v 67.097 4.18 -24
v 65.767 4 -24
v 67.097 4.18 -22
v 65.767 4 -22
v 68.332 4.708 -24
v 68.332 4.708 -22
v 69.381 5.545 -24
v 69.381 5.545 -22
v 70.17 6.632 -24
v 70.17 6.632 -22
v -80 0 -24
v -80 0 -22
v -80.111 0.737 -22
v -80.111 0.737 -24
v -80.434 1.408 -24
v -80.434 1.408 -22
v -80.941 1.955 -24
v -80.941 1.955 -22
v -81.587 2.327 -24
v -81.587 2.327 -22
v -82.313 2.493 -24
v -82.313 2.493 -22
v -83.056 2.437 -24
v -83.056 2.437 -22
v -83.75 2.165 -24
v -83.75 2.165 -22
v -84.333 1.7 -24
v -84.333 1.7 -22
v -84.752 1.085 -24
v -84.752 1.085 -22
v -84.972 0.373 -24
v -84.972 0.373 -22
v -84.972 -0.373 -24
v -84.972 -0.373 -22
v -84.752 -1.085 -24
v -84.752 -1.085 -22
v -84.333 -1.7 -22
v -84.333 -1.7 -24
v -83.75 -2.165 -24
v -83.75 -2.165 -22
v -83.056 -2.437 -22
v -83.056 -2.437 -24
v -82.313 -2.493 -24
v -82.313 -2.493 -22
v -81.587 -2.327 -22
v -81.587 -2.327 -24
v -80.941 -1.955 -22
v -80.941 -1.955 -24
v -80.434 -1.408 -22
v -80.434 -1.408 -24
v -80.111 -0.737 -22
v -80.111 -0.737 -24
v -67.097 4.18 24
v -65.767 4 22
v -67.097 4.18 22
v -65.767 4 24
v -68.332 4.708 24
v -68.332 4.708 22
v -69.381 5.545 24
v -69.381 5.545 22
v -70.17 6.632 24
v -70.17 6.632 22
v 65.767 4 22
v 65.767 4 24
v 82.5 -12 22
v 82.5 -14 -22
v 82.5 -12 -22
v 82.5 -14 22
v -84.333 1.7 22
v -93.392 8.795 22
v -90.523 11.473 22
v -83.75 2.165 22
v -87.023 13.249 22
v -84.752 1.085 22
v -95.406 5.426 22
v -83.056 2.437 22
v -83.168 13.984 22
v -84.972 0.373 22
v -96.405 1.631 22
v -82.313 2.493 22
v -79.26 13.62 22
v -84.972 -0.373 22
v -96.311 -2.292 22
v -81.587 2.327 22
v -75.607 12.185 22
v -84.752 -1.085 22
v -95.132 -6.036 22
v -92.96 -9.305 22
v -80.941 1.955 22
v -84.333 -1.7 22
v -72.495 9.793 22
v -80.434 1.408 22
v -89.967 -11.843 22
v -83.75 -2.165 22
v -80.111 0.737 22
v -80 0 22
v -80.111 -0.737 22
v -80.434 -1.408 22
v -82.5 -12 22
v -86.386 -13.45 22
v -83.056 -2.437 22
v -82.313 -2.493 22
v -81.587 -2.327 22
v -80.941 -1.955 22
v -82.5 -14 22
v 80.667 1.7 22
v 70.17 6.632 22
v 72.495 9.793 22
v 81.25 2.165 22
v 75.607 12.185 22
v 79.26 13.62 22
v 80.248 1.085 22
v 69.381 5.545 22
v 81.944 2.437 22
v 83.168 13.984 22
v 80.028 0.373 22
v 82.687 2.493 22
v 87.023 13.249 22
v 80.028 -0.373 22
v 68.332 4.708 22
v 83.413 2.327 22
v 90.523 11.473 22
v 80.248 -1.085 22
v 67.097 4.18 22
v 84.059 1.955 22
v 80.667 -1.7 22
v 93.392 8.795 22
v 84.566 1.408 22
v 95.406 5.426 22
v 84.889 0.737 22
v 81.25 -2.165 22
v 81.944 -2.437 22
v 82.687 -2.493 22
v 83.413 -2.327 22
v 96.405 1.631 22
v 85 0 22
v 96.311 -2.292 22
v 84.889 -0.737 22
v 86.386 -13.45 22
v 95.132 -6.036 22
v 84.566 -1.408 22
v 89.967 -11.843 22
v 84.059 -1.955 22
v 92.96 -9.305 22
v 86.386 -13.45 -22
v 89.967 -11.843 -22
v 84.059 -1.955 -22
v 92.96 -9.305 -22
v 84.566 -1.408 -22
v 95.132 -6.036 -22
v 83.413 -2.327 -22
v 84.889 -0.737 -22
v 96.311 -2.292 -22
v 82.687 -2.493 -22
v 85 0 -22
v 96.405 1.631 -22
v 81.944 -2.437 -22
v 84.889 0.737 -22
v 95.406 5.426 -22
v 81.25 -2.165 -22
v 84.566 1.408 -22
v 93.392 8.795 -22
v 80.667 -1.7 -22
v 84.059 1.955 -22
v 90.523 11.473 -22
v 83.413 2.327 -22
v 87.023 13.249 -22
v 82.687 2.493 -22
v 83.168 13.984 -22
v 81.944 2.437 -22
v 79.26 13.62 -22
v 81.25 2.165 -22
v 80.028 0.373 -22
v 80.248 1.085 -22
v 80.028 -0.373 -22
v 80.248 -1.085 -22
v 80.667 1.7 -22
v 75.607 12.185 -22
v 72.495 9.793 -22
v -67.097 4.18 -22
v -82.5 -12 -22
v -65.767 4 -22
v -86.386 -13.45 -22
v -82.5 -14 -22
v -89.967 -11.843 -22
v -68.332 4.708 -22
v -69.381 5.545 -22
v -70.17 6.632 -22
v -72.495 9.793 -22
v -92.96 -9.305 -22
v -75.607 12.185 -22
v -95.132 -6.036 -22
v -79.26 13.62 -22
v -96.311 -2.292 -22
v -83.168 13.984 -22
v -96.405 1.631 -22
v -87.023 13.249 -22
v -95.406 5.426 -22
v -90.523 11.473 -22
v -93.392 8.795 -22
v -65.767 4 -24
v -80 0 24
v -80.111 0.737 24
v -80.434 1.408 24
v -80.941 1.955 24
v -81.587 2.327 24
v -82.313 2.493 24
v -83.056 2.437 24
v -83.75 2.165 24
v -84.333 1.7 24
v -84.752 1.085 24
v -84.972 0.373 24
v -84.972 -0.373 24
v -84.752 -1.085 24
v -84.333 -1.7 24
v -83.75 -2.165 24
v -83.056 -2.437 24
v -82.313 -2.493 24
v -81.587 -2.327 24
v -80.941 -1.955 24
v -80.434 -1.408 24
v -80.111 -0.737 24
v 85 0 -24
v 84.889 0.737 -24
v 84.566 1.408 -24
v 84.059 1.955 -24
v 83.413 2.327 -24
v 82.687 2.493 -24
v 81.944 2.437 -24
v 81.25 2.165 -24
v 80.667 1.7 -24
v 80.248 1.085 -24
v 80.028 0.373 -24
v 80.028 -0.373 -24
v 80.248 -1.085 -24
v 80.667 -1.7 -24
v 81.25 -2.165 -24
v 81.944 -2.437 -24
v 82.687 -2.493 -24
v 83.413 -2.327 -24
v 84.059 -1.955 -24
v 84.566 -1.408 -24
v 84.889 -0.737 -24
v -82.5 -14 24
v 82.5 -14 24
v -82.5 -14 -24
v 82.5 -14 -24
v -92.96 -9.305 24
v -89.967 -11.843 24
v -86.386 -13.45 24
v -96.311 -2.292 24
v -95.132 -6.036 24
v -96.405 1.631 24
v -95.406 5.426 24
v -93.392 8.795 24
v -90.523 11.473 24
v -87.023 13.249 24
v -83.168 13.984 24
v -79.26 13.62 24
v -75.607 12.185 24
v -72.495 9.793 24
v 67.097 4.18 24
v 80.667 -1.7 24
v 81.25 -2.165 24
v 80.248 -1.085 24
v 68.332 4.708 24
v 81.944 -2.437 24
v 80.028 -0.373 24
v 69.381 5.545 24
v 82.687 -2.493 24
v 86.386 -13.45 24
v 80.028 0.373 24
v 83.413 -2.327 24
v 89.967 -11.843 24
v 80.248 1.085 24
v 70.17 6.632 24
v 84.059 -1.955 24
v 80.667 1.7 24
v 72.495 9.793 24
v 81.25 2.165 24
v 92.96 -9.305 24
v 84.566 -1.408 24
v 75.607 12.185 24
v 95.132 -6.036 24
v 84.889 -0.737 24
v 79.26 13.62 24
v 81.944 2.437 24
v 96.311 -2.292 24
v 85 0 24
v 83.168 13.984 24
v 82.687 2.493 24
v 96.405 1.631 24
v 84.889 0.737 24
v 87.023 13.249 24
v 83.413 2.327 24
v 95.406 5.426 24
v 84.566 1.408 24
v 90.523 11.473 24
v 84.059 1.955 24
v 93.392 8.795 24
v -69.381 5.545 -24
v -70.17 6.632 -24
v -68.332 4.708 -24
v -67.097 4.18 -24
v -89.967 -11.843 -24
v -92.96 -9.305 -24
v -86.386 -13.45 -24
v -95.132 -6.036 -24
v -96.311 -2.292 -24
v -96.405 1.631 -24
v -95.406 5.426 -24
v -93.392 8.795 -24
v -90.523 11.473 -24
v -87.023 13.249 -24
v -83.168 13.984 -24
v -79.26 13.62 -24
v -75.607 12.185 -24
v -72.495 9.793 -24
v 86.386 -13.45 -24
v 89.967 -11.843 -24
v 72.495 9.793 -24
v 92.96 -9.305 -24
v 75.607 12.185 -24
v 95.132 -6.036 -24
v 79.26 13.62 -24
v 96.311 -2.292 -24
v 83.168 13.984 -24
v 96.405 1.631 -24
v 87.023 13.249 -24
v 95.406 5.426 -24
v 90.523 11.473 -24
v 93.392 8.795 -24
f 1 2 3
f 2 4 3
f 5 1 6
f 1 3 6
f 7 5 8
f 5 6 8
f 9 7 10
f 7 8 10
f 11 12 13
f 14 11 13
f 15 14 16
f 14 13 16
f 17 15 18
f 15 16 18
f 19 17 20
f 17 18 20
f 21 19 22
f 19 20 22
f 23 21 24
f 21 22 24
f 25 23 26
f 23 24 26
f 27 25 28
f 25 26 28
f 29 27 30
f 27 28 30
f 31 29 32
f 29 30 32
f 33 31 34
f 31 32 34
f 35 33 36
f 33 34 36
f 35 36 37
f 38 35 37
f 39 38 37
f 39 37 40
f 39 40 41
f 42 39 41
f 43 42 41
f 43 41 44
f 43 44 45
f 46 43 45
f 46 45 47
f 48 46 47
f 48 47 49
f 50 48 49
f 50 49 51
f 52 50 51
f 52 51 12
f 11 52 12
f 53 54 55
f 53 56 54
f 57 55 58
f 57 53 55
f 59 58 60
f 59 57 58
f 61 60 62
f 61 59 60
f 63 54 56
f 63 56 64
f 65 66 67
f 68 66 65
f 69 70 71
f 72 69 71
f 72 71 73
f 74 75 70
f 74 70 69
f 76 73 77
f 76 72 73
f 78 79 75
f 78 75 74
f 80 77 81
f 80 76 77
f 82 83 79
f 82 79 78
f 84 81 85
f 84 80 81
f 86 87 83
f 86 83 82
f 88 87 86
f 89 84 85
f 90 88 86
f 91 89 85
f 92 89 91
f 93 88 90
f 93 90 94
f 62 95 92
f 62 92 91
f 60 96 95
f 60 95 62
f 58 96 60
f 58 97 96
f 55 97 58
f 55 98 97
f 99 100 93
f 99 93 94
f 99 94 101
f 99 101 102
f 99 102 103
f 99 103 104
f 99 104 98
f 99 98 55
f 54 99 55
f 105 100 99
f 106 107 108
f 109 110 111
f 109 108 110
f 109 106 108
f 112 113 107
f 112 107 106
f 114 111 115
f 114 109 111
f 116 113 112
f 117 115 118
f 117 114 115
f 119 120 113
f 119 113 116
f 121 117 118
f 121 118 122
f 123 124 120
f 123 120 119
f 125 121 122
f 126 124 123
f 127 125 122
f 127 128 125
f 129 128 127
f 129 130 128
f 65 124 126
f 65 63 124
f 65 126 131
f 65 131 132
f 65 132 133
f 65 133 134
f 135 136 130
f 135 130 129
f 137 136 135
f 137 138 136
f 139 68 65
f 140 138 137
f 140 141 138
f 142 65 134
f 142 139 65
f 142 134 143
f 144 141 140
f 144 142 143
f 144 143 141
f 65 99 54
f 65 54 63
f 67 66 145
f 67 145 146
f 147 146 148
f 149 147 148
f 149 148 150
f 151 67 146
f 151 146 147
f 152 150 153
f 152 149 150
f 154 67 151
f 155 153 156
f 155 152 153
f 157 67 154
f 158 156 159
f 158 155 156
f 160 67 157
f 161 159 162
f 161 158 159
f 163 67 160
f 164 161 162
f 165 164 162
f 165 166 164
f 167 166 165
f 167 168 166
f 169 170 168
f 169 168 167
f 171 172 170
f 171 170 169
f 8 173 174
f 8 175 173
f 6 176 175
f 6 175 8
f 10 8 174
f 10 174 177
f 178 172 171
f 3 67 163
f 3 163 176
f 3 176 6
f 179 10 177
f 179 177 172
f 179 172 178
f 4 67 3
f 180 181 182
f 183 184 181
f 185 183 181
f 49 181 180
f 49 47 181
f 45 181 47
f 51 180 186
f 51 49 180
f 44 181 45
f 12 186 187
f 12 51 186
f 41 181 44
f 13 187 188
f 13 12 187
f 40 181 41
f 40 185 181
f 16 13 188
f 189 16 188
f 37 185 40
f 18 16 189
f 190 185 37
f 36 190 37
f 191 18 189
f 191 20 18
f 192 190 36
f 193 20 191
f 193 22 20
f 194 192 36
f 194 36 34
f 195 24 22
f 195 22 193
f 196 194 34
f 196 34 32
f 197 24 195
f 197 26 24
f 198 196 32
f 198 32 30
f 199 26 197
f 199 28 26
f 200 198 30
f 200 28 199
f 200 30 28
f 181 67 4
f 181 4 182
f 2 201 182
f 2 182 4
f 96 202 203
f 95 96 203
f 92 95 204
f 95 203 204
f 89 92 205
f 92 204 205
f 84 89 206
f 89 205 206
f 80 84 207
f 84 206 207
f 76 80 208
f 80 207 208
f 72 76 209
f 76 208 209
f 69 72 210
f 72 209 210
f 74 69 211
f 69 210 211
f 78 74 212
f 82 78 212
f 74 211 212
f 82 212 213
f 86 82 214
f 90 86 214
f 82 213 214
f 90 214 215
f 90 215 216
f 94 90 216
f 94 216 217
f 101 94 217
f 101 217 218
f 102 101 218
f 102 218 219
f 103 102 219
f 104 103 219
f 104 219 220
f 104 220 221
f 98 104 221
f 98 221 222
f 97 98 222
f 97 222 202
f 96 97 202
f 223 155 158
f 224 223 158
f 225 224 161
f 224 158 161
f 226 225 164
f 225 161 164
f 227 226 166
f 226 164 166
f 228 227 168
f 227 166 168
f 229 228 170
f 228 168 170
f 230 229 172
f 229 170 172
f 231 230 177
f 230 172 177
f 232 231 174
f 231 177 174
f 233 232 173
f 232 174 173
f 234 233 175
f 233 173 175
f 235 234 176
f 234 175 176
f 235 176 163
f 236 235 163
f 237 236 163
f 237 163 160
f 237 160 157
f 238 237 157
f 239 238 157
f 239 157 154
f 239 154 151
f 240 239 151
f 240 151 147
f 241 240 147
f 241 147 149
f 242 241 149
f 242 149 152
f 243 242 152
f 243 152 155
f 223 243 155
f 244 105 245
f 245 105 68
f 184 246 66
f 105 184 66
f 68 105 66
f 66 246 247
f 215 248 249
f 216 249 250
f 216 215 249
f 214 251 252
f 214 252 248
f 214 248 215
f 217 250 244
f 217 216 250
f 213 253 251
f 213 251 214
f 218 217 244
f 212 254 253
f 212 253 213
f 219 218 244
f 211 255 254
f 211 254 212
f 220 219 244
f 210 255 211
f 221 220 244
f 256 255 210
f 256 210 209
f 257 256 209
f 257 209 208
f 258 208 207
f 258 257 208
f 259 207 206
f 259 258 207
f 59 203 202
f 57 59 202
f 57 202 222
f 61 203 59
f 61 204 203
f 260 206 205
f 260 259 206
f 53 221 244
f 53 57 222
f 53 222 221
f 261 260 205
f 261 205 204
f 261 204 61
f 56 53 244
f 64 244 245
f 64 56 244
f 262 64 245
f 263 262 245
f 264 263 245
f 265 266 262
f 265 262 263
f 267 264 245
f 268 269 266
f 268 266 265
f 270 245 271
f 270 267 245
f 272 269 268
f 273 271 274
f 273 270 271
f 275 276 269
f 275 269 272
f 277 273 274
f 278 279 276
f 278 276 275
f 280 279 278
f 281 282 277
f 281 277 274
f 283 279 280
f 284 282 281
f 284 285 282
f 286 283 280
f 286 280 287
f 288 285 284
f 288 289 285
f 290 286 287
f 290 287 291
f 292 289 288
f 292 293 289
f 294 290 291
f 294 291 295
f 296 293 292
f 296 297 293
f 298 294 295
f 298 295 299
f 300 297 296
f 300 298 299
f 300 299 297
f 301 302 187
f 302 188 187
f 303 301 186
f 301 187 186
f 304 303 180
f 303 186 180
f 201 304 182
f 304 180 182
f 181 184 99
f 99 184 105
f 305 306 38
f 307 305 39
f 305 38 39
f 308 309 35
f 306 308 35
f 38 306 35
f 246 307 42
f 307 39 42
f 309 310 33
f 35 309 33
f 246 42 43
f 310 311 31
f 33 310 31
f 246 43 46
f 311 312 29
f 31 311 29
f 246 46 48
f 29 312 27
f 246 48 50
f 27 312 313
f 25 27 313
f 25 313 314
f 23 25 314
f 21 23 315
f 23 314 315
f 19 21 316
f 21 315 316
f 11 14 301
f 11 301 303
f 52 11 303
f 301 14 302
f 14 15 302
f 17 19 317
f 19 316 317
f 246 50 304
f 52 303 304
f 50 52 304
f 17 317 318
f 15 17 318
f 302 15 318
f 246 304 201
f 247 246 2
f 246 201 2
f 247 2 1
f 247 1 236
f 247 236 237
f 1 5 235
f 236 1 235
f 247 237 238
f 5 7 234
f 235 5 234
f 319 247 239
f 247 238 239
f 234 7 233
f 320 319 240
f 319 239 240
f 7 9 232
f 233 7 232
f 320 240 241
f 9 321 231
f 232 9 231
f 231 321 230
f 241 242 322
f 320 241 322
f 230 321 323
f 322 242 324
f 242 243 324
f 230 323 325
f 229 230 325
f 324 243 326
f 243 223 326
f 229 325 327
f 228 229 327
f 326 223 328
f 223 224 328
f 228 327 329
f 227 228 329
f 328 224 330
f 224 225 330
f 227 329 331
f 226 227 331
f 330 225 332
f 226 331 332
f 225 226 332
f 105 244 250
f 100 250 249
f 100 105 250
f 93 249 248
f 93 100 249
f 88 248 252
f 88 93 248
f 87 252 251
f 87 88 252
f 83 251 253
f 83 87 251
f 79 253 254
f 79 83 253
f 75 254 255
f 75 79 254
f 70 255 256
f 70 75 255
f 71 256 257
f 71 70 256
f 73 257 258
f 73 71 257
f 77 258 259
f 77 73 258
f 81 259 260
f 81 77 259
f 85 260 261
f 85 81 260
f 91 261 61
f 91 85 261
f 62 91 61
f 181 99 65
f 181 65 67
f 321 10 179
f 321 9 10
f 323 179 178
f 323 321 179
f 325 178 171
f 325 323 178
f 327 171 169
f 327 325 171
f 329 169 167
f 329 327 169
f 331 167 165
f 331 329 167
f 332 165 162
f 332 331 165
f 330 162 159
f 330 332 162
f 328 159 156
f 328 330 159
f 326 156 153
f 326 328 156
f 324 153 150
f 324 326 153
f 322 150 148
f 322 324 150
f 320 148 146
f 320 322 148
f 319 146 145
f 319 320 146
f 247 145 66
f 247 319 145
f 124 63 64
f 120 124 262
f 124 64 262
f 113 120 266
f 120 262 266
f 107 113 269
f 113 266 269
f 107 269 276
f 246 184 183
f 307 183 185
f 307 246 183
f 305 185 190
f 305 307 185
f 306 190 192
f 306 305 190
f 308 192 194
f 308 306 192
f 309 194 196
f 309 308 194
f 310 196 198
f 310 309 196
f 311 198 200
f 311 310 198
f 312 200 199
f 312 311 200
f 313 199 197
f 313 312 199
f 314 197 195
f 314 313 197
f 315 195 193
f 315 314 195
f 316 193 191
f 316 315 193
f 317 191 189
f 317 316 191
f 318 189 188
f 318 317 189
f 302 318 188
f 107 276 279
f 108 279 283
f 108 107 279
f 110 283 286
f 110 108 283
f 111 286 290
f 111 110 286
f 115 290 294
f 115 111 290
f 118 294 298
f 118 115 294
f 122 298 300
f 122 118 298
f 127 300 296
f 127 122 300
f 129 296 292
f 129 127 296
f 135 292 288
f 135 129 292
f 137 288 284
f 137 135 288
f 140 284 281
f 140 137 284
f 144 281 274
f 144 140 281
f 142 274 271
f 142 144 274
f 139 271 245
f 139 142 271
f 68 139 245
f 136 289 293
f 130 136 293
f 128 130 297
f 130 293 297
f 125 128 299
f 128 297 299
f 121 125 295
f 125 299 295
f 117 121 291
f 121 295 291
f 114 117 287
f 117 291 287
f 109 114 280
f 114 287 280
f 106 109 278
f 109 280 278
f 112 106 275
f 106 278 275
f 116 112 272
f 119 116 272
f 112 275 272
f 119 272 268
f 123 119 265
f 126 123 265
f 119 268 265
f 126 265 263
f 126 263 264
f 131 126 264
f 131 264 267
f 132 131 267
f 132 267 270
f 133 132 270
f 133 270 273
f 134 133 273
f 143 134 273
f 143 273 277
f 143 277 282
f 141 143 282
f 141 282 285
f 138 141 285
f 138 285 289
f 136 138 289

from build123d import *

# Parameters (mm, degrees)
SKETCH2_W                      = 195
SKETCH2_H                      = 48
BOSS_EXTRUDE1_DEPTH            = 14
SHELL1_T                       = -2
SKETCH3_R                      = 2.5
CUT_EXTRUDE1_DEPTH             = 110.573035004
CUT_EXTRUDE2_REACH             = 196.99
SKETCH4_W                      = 44
SKETCH4_H                      = 26
CUT_EXTRUDE2_DIRECTION_2_REACH = 196.99
CUT_EXTRUDE3_DEPTH             = 102.381704464
CUT_EXTRUDE3_DEPTH_BACK        = 102.381704464
CUT_EXTRUDE4_REACH             = 105.307
SKETCH7_W                      = 7.211102551
SKETCH7_H                      = 44
FILLET1_R                      = 5


with BuildPart() as part:
    # Sketch2 → Boss-Extrude1 (new, symmetric)
    with BuildSketch(Plane(origin=(0, 0, 0), x_dir=(1, 0, 0), z_dir=(0, 1, 0))):
        Rectangle(SKETCH2_W, SKETCH2_H)
    extrude(amount=BOSS_EXTRUDE1_DEPTH, both=True)

    # Shell1
    shell1_openings = [part.faces().sort_by_distance(p)[0] for p in [
        (0, 14, 0),
    ]]
    offset(amount=SHELL1_T, openings=shell1_openings, kind=Kind.INTERSECTION)

    # Sketch3 → Cut-Extrude1 (cut, through all)
    with BuildSketch(Plane.XY.offset(24)):
        with Locations((-82.5, 0)):
            Circle(SKETCH3_R)
        with Locations((82.5, 0)):
            Circle(SKETCH3_R)
    extrude(amount=-CUT_EXTRUDE1_DEPTH, mode=Mode.SUBTRACT)

    # Sketch4 → Cut-Extrude2 (cut, up to next)
    with BuildSketch(Plane(origin=(-95.5, 0, 0), x_dir=(0, 0, -1), z_dir=(1, 0, 0)), mode=Mode.PRIVATE) as cut_extrude2_sk1:
        with Locations((0, 1)):
            Rectangle(SKETCH4_W, SKETCH4_H)
    cut_extrude2_tool1 = extrude(cut_extrude2_sk1.sketch, amount=-CUT_EXTRUDE2_REACH, mode=Mode.PRIVATE) & part.part
    add(cut_extrude2_tool1.solids().sort_by_distance((-95.5, 1, 0))[0], mode=Mode.SUBTRACT)

    # Sketch4 → Cut-Extrude2 direction 2 (cut, up to next)
    with BuildSketch(Plane(origin=(-95.5, 0, 0), x_dir=(0, 0, -1), z_dir=(1, 0, 0)), mode=Mode.PRIVATE) as cut_extrude2_direction_2_sk1:
        with Locations((0, 1)):
            Rectangle(SKETCH4_W, SKETCH4_H)
    cut_extrude2_direction_2_tool1 = extrude(cut_extrude2_direction_2_sk1.sketch, amount=CUT_EXTRUDE2_DIRECTION_2_REACH, mode=Mode.PRIVATE) & part.part
    add(cut_extrude2_direction_2_tool1.solids().sort_by_distance((-95.5, 1, 0))[0], mode=Mode.SUBTRACT)

    # Sketch6 → Cut-Extrude3 (cut, two sides: drawn at the far end of the back side and taken through both)
    with BuildSketch(Plane.XY.offset(-CUT_EXTRUDE3_DEPTH_BACK)):
        with BuildLine():
            Line((-69.083592135, 4), (69.083592135, 4))
            ThreePointArc((69.083592135, 4), (93.72497216, 8.366600265), (82.5, -14))
            Line((82.5, -14), (97.5, -14))
            Line((97.5, -14), (97.5, 24))
            Line((97.5, 24), (-97.5, 24))
            Line((-97.5, 24), (-97.5, -14))
            Line((-97.5, -14), (-82.5, -14))
            ThreePointArc((-82.5, -14), (-93.72497216, 8.366600265), (-69.083592135, 4))
        make_face()
    extrude(amount=CUT_EXTRUDE3_DEPTH + CUT_EXTRUDE3_DEPTH_BACK, mode=Mode.SUBTRACT)

    # Sketch7 → Cut-Extrude4 (cut, up to next)
    with BuildSketch(Plane.XZ.offset(14), mode=Mode.PRIVATE) as cut_extrude4_sk1:
        with Locations((86.105551276, 0)):
            Rectangle(SKETCH7_W, SKETCH7_H)
    cut_extrude4_tool1 = extrude(cut_extrude4_sk1.sketch, amount=-CUT_EXTRUDE4_REACH, mode=Mode.PRIVATE) & part.part
    # Sketch7 → Cut-Extrude4 (cut, up to next)
    with BuildSketch(Plane.XZ.offset(14), mode=Mode.PRIVATE) as cut_extrude4_sk2:
        with Locations((-86.105551276, 0)):
            Rectangle(SKETCH7_W, SKETCH7_H)
    cut_extrude4_tool2 = extrude(cut_extrude4_sk2.sketch, amount=-CUT_EXTRUDE4_REACH, mode=Mode.PRIVATE) & part.part
    add(cut_extrude4_tool1.solids().sort_by_distance((86.105551, -14, 0))[0], mode=Mode.SUBTRACT)
    add(cut_extrude4_tool2.solids().sort_by_distance((-86.105551, -14, 0))[0], mode=Mode.SUBTRACT)

    # Fillet1
    fillet1_edges = [part.edges().sort_by_distance(p)[0] for p in [
        (69.083592135, 4, -23),
        (-69.083592135, 4, 23),
        (-69.083592135, 4, -23),
        (69.083592135, 4, 23),
    ]]
    fillet(fillet1_edges, radius=FILLET1_R)


solid = part.part
